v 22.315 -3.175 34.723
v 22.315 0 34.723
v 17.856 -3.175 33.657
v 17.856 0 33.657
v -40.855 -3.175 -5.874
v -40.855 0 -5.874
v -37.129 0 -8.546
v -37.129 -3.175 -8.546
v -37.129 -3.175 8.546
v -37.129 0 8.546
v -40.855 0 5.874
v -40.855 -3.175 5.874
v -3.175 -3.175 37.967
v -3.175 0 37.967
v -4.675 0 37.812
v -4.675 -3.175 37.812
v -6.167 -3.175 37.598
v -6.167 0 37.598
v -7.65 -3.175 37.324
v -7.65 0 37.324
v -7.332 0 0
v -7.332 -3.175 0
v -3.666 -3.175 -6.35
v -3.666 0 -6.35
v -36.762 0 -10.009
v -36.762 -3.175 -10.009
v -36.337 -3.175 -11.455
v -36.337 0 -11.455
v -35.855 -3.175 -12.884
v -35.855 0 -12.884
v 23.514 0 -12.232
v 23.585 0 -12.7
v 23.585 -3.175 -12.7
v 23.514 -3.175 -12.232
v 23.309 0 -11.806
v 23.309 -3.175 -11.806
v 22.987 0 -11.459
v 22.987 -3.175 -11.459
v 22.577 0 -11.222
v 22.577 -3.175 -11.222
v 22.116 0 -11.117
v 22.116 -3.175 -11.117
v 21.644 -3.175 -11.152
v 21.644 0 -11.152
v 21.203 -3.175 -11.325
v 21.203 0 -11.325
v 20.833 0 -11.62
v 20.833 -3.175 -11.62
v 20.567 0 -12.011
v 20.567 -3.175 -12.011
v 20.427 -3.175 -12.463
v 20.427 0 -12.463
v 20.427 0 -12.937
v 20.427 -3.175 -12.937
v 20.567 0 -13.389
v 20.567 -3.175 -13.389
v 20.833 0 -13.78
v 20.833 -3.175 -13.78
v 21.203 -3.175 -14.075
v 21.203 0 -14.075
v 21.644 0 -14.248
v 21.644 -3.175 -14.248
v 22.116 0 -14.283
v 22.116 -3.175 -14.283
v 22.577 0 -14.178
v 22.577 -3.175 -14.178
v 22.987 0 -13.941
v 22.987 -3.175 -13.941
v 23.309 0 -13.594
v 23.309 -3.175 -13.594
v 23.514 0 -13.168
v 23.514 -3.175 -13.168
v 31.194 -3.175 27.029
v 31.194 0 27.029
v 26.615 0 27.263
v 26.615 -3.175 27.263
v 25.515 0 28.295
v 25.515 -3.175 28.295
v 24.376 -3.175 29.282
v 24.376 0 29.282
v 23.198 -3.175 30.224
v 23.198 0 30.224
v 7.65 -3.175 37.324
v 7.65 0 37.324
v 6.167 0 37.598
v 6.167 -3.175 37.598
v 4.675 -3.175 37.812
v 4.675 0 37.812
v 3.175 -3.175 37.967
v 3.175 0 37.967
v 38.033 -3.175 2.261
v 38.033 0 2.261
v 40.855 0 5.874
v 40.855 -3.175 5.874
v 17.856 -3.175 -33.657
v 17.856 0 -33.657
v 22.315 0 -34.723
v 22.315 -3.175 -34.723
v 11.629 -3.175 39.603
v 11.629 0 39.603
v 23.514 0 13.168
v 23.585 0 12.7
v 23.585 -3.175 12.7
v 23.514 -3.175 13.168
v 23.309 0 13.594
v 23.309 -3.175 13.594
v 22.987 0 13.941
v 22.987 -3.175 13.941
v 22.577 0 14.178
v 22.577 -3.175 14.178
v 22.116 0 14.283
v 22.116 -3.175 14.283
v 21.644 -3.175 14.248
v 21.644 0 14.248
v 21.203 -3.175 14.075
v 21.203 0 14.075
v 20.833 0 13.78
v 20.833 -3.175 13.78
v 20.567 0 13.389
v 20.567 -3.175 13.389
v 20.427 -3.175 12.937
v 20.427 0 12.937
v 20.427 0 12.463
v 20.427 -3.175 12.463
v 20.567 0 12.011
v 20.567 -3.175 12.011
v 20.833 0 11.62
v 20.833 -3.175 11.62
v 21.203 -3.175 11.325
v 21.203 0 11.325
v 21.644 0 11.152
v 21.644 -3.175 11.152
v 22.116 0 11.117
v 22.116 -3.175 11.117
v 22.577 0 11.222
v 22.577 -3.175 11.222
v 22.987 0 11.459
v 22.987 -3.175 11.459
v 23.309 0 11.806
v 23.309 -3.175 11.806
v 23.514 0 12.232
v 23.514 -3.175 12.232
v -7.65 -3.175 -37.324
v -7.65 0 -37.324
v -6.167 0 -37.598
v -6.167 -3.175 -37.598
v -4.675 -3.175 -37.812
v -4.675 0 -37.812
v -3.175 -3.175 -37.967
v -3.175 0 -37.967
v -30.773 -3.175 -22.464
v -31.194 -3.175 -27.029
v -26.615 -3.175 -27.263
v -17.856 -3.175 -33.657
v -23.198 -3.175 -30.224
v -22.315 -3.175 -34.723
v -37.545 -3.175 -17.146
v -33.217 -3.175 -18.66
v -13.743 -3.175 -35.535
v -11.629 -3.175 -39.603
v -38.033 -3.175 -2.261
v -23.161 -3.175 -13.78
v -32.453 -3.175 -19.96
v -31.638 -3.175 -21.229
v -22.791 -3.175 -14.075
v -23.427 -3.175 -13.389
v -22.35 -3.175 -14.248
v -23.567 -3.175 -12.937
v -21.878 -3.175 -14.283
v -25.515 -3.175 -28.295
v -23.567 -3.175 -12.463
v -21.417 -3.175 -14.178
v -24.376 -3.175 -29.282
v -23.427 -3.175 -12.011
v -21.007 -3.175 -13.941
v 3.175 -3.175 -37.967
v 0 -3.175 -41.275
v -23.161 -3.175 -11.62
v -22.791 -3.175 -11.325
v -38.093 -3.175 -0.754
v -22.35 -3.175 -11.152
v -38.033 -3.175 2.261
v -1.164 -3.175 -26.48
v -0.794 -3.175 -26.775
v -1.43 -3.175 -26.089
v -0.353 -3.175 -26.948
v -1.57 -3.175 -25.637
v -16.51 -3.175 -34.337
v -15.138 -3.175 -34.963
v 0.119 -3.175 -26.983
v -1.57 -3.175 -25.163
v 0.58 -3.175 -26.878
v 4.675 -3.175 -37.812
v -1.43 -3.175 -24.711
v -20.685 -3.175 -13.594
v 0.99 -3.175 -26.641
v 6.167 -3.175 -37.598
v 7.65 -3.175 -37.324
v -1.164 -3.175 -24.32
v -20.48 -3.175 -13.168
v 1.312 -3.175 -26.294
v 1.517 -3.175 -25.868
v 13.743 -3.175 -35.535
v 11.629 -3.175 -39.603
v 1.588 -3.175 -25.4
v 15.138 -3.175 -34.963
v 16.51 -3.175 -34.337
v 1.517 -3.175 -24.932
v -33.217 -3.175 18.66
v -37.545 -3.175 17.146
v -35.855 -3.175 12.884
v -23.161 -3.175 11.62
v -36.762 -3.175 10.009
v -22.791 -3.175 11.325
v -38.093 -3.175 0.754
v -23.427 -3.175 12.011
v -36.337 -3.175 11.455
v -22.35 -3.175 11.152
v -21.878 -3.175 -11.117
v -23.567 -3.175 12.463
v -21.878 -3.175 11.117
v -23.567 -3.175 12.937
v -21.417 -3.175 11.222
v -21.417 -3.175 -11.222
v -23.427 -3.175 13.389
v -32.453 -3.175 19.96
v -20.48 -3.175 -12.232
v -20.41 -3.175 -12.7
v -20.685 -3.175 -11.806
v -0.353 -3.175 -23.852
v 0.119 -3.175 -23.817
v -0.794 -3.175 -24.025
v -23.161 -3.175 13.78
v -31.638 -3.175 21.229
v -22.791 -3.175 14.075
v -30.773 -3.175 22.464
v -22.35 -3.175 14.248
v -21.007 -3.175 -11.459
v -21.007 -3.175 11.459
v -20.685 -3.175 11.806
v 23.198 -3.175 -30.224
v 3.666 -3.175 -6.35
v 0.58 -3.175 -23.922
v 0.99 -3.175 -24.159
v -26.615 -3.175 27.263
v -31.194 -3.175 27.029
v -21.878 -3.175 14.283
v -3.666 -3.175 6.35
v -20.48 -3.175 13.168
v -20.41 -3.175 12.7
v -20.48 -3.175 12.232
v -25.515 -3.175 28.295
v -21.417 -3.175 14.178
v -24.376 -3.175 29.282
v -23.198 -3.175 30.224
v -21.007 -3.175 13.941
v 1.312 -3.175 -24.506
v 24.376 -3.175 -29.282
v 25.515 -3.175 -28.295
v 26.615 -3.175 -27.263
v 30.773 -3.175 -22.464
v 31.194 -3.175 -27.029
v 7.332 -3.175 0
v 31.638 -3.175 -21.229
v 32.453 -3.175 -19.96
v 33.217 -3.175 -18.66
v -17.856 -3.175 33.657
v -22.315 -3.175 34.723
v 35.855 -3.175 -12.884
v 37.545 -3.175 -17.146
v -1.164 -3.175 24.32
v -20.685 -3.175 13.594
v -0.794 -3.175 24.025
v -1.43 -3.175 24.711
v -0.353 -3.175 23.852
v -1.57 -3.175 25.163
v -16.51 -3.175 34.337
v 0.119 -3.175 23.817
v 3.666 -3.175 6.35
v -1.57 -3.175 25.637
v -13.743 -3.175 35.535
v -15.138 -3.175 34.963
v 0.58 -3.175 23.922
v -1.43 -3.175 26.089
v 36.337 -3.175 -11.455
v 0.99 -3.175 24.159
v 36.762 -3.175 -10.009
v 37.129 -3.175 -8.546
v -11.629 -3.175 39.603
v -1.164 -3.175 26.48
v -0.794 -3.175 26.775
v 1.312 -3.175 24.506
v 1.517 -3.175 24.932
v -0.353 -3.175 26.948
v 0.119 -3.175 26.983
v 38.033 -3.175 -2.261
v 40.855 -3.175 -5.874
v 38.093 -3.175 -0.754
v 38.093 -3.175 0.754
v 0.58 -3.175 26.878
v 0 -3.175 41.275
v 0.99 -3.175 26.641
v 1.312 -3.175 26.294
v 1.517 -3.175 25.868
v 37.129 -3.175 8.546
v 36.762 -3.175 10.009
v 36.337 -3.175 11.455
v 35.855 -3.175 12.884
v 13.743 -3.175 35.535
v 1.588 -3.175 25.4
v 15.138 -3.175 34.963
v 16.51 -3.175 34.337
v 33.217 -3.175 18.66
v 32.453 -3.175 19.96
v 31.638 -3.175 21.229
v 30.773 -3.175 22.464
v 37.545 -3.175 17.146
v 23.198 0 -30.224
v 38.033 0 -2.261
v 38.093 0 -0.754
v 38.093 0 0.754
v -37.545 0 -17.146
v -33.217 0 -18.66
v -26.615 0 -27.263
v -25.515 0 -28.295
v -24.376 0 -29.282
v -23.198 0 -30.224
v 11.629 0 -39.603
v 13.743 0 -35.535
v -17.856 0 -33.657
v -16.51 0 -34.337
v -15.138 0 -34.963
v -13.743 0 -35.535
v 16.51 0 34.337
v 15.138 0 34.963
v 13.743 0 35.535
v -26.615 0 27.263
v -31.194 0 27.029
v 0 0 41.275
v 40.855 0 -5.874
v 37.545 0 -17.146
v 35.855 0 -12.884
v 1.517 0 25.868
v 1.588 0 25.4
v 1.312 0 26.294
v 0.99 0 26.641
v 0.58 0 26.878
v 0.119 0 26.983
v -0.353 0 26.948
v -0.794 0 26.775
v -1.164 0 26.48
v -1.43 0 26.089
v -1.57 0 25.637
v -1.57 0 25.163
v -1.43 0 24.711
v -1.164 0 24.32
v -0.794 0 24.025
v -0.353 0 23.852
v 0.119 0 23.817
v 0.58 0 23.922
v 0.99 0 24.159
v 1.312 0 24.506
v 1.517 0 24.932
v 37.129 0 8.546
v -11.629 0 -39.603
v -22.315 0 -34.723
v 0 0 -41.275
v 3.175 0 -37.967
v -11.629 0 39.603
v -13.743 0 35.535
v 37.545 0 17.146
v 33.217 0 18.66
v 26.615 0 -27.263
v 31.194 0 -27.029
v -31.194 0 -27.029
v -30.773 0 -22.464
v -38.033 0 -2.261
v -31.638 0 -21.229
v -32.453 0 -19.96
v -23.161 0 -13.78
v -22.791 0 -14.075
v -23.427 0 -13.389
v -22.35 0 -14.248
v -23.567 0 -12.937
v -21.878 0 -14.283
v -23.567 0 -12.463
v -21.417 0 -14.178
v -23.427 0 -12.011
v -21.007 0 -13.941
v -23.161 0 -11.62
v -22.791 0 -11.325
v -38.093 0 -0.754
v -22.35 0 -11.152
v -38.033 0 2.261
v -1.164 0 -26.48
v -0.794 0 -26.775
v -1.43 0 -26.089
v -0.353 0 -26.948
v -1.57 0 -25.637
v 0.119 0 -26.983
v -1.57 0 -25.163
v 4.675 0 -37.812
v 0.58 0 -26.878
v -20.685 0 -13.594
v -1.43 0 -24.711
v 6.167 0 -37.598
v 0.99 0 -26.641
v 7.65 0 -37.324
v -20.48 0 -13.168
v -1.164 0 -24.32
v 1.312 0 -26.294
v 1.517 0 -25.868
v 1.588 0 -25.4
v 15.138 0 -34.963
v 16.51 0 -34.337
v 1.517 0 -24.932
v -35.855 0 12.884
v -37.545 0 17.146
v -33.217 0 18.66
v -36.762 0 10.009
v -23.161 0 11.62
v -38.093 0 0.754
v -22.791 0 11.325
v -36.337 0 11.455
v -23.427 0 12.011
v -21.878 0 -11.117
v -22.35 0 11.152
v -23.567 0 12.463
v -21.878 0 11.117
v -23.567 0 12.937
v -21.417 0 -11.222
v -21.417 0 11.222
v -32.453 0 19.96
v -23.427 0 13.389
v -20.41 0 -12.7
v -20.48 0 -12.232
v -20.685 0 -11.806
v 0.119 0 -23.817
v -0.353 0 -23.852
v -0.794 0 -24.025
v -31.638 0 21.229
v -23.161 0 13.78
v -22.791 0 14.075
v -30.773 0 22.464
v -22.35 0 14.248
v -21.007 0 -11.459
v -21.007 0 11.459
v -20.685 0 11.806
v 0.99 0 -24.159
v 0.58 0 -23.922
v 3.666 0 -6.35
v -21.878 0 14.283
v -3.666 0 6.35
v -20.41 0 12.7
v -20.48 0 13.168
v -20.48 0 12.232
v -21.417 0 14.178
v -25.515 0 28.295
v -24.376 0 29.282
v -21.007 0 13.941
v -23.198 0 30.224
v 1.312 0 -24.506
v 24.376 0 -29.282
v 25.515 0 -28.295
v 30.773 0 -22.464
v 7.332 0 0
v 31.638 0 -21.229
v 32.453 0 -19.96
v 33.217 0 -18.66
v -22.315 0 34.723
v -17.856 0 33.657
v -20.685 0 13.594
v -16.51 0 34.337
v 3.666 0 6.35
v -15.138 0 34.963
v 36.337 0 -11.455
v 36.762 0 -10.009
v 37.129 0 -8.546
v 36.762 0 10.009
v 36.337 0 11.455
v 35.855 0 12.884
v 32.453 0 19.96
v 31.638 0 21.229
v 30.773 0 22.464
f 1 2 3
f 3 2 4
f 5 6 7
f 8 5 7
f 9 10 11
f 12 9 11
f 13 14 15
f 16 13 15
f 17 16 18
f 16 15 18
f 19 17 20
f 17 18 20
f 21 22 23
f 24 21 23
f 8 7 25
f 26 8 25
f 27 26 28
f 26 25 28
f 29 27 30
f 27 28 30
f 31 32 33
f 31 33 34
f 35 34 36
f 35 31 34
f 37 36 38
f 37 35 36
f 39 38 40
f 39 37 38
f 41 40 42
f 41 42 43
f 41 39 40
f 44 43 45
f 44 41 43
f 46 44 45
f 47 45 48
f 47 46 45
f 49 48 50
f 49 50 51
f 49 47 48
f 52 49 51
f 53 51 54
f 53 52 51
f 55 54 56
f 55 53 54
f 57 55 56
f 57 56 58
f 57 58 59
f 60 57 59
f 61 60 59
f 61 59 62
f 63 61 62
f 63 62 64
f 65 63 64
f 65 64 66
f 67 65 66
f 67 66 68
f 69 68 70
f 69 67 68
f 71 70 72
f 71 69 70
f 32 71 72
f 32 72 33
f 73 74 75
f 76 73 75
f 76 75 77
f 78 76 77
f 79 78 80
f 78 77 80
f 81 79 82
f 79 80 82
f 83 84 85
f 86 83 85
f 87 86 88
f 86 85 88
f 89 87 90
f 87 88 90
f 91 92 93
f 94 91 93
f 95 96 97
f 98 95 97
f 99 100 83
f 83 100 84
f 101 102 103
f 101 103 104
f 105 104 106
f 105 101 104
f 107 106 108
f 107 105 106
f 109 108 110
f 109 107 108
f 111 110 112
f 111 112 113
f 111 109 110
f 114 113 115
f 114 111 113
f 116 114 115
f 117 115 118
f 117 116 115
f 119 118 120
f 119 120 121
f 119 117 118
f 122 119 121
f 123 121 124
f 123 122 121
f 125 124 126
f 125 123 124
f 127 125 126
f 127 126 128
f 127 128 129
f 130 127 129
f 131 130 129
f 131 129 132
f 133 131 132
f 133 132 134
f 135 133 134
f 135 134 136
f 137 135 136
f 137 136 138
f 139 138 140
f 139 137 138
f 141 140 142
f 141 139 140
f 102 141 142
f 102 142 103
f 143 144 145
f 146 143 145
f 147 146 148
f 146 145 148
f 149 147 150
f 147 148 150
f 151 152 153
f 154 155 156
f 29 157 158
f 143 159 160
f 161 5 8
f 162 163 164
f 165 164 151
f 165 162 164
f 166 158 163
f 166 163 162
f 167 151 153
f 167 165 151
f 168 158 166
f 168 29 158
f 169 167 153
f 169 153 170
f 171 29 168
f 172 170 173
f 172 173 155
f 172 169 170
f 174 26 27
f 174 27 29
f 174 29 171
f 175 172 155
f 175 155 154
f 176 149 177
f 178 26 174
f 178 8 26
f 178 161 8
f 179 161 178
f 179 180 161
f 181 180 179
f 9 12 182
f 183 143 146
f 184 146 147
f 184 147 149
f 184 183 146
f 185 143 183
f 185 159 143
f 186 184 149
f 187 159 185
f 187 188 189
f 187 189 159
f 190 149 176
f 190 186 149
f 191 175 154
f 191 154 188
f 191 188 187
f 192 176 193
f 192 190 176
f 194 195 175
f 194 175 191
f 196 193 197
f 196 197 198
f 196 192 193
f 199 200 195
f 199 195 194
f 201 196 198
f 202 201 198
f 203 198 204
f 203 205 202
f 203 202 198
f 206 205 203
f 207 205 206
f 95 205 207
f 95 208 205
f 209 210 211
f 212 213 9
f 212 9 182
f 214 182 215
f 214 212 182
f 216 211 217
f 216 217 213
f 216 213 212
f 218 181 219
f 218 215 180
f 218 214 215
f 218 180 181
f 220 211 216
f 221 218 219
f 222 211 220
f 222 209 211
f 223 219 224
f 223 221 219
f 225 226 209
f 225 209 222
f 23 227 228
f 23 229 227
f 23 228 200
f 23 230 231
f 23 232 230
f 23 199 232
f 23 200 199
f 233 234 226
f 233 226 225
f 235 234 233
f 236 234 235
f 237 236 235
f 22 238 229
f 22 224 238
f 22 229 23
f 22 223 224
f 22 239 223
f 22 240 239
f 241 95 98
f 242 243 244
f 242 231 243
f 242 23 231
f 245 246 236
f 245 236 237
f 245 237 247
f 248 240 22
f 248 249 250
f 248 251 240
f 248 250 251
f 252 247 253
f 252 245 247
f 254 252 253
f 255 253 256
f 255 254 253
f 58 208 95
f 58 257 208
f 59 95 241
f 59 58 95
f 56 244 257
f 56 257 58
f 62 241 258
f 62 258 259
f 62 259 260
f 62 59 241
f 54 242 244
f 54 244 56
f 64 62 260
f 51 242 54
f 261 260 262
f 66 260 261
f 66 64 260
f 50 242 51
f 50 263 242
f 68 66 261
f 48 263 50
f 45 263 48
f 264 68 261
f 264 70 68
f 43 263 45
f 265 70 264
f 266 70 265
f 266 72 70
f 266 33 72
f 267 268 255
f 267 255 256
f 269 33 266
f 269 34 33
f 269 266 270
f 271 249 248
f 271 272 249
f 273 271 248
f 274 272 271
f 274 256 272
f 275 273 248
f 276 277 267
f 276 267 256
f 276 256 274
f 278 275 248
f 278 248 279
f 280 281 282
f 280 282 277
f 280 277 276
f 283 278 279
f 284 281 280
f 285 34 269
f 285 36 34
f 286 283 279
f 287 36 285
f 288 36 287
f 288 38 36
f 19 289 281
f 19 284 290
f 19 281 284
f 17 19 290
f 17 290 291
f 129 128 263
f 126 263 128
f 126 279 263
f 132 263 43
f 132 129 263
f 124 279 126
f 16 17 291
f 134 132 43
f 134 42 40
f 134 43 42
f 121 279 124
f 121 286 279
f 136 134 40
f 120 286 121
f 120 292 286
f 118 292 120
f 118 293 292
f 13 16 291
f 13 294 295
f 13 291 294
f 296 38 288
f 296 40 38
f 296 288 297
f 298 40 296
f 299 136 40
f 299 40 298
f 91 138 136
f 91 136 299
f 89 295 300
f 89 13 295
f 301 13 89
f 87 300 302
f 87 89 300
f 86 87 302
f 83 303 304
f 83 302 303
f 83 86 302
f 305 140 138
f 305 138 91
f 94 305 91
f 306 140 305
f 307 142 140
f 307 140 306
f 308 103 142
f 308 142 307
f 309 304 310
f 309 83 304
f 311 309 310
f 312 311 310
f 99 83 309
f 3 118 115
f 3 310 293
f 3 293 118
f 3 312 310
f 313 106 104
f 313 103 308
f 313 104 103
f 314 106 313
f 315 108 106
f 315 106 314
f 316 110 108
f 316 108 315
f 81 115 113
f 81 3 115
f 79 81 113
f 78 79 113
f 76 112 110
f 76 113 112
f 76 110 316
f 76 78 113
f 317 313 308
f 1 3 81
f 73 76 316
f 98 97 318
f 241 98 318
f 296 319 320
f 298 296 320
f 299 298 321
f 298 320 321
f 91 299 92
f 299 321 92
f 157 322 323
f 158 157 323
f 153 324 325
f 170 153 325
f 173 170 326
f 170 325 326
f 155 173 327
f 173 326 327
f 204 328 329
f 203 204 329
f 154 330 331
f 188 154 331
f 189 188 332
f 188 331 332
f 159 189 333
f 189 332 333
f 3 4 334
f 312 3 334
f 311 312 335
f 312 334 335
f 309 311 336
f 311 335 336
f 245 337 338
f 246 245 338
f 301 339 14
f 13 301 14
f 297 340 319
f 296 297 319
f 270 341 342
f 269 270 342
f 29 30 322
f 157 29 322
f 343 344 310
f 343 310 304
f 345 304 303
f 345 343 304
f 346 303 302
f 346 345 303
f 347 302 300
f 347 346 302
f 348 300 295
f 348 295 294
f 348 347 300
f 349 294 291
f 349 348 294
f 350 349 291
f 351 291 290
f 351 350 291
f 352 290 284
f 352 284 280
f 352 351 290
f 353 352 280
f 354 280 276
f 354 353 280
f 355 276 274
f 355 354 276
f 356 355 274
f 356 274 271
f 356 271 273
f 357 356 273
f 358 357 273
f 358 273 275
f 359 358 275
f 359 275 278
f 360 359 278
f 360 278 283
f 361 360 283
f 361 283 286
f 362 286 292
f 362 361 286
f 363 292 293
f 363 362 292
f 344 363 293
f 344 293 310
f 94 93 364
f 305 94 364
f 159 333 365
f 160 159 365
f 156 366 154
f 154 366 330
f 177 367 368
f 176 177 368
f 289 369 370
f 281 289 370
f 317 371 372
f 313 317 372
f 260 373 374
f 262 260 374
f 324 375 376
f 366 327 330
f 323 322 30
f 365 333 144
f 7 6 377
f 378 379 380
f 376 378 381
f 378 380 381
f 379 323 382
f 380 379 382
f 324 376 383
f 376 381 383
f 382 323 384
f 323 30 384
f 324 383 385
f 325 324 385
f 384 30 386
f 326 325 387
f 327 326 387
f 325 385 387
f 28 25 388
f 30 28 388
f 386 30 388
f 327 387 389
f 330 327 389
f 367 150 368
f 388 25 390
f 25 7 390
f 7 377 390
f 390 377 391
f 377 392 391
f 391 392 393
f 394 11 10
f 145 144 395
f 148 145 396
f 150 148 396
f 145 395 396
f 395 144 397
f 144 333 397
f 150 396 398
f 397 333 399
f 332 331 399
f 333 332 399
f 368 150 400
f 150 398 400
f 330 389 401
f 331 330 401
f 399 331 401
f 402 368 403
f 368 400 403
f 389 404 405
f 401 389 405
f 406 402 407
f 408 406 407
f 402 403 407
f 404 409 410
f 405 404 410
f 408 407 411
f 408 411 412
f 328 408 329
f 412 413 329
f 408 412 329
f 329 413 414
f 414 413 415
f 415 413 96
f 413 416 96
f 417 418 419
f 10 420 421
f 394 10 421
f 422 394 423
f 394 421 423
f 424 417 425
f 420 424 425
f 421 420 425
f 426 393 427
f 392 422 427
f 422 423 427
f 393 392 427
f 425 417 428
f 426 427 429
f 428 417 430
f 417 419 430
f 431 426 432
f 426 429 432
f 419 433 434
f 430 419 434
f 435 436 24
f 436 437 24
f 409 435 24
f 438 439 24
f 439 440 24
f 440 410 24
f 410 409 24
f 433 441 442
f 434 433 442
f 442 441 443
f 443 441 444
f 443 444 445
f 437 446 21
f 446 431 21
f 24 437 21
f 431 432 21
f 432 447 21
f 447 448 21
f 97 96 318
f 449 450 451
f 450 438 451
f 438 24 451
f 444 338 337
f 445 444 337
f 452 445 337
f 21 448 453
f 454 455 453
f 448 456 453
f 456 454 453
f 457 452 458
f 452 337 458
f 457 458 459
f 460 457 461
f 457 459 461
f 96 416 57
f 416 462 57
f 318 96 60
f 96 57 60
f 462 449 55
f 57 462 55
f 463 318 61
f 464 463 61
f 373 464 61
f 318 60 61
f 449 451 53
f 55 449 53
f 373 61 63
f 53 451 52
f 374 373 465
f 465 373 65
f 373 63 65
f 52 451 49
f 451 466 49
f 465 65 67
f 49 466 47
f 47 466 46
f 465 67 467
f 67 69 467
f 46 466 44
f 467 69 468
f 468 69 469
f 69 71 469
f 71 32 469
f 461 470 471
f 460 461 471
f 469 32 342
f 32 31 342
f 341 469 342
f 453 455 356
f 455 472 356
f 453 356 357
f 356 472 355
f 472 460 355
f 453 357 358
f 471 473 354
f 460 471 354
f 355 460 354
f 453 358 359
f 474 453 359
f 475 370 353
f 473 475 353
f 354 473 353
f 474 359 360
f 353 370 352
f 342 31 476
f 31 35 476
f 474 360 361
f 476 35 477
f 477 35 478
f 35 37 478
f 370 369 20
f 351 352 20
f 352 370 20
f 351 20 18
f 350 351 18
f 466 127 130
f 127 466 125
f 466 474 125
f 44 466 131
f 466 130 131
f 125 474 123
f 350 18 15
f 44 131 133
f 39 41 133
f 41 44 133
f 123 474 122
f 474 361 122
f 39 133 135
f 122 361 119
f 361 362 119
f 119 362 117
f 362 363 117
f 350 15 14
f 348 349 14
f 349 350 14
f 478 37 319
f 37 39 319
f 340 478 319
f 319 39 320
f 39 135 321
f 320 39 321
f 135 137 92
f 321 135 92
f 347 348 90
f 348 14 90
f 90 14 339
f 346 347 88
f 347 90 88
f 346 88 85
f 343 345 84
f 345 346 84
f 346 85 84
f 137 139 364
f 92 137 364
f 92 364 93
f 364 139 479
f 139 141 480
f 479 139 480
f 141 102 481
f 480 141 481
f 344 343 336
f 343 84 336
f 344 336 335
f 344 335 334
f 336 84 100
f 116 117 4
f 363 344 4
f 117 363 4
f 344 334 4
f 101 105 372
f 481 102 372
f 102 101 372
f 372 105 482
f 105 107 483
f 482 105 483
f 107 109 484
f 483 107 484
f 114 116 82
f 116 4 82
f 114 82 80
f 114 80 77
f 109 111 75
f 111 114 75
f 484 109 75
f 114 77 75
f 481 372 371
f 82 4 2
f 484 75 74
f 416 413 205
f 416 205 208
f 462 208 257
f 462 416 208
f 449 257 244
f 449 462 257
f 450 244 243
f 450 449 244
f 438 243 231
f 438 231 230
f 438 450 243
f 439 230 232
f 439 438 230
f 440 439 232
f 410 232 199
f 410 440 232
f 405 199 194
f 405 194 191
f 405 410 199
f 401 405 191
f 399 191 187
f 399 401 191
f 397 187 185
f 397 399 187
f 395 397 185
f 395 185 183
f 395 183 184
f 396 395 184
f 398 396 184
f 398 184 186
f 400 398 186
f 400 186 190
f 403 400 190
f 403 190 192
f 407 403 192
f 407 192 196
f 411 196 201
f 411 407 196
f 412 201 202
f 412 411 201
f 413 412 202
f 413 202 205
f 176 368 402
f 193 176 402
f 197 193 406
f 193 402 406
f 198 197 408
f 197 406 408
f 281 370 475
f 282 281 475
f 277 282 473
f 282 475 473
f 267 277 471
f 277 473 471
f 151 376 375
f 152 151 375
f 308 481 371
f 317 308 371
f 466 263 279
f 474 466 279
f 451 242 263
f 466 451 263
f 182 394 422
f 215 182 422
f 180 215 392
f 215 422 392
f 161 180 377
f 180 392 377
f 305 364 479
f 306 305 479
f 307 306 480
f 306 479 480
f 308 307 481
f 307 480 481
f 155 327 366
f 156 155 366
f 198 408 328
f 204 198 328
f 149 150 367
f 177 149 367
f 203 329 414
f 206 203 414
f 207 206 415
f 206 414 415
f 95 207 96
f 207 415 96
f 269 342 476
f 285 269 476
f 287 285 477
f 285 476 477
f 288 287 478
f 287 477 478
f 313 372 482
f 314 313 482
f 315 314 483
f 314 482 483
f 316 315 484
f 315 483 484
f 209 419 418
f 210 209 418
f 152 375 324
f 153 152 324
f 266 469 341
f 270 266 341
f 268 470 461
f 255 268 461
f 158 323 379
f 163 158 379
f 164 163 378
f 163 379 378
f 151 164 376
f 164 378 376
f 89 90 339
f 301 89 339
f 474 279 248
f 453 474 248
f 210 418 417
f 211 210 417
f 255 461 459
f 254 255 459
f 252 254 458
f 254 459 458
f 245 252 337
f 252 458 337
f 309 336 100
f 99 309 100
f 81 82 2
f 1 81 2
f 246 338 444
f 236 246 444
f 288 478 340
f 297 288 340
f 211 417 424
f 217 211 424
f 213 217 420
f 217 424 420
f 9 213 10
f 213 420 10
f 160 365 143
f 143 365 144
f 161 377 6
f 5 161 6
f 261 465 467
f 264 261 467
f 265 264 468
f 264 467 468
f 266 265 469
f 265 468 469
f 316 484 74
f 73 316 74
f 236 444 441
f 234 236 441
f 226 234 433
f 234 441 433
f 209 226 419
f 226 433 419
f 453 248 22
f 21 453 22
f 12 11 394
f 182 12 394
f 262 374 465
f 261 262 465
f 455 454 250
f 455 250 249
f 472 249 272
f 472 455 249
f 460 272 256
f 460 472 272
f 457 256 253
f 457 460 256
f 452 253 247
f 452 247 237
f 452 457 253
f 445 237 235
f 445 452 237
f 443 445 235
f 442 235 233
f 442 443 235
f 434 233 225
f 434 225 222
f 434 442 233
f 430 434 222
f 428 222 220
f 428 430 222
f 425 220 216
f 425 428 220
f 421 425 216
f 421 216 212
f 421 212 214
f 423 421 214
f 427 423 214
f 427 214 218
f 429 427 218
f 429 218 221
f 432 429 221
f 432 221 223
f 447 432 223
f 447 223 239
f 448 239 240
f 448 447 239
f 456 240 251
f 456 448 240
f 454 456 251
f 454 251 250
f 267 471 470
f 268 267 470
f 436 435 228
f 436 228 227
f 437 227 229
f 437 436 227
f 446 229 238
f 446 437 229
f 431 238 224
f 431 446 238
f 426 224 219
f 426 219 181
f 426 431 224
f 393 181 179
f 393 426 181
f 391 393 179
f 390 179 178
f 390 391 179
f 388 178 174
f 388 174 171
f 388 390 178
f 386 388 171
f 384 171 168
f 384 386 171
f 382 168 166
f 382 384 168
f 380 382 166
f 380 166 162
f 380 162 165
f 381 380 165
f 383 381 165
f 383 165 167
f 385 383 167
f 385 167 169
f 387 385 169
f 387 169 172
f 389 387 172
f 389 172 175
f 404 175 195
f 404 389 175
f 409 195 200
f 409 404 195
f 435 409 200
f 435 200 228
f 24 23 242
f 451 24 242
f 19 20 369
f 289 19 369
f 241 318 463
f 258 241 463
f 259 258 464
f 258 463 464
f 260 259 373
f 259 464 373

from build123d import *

# Parameters (mm, degrees)
F0_R     = 1.5875
F1_DEPTH = 3.175
F3_DEPTH = 3.176


with BuildPart() as f1:
    # F0 (on Front) → F1 (new body)
    with BuildSketch(Plane.XZ):
        with BuildLine():
            Line((-22.31495, 34.72274), (-23.197748, 30.22374))
            ThreePointArc((-23.197748, 30.22374), (-24.950194, 28.794059), (-26.614722, 27.262915))
            Line((-26.614722, 27.262915), (-31.193564, 27.029377))
            Line((-31.193564, 27.029377), (-30.773088, 22.463906))
            ThreePointArc((-30.773088, 22.463906), (-32.05176, 20.598415), (-33.21749, 18.660342))
            Line((-33.21749, 18.660342), (-37.545061, 17.146255))
            Line((-37.545061, 17.146255), (-35.855375, 12.884179))
            ThreePointArc((-35.855375, 12.884179), (-36.556682, 10.73401), (-37.129174, 8.546019))
            Line((-37.129174, 8.546019), (-40.85488, 5.874045))
            Line((-40.85488, 5.874045), (-38.032873, 2.260652))
            ThreePointArc((-38.032873, 2.260652), (-38.1, 0), (-38.032873, -2.260652))
            Line((-38.032873, -2.260652), (-40.85488, -5.874045))
            Line((-40.85488, -5.874045), (-37.129174, -8.546019))
            ThreePointArc((-37.129174, -8.546019), (-36.556682, -10.73401), (-35.855375, -12.884179))
            Line((-35.855375, -12.884179), (-37.545061, -17.146255))
            Line((-37.545061, -17.146255), (-33.21749, -18.660342))
            ThreePointArc((-33.21749, -18.660342), (-32.05176, -20.598415), (-30.773088, -22.463906))
            Line((-30.773088, -22.463906), (-31.193564, -27.029377))
            Line((-31.193564, -27.029377), (-26.614722, -27.262915))
            ThreePointArc((-26.614722, -27.262915), (-24.950194, -28.794059), (-23.197748, -30.22374))
            Line((-23.197748, -30.22374), (-22.31495, -34.72274))
            Line((-22.31495, -34.72274), (-17.855788, -33.656809))
            ThreePointArc((-17.855788, -33.656809), (-15.827312, -34.656979), (-13.743065, -35.535027))
            Line((-13.743065, -35.535027), (-11.628511, -39.603072))
            Line((-11.628511, -39.603072), (-7.650284, -37.324029))
            ThreePointArc((-7.650284, -37.324029), (-5.422195, -37.712197), (-3.175, -37.967478))
            Line((-3.175, -37.967478), (0, -41.275))
            Line((0, -41.275), (3.175, -37.967478))
            ThreePointArc((3.175, -37.967478), (5.422195, -37.712197), (7.650284, -37.324029))
            Line((7.650284, -37.324029), (11.628511, -39.603072))
            Line((11.628511, -39.603072), (13.743065, -35.535027))
            ThreePointArc((13.743065, -35.535027), (15.827312, -34.656979), (17.855788, -33.656809))
            Line((17.855788, -33.656809), (22.31495, -34.72274))
            Line((22.31495, -34.72274), (23.197748, -30.22374))
            ThreePointArc((23.197748, -30.22374), (24.950194, -28.794059), (26.614722, -27.262915))
            Line((26.614722, -27.262915), (31.193564, -27.029377))
            Line((31.193564, -27.029377), (30.773088, -22.463906))
            ThreePointArc((30.773088, -22.463906), (32.05176, -20.598415), (33.21749, -18.660342))
            Line((33.21749, -18.660342), (37.545061, -17.146255))
            Line((37.545061, -17.146255), (35.855375, -12.884179))
            ThreePointArc((35.855375, -12.884179), (36.556682, -10.73401), (37.129174, -8.546019))
            Line((37.129174, -8.546019), (40.85488, -5.874045))
            Line((40.85488, -5.874045), (38.032873, -2.260652))
            ThreePointArc((38.032873, -2.260652), (38.1, 0), (38.032873, 2.260652))
            Line((38.032873, 2.260652), (40.85488, 5.874045))
            Line((40.85488, 5.874045), (37.129174, 8.546019))
            ThreePointArc((37.129174, 8.546019), (36.556682, 10.73401), (35.855375, 12.884179))
            Line((35.855375, 12.884179), (37.545061, 17.146255))
            Line((37.545061, 17.146255), (33.21749, 18.660342))
            ThreePointArc((33.21749, 18.660342), (32.05176, 20.598415), (30.773088, 22.463906))
            Line((30.773088, 22.463906), (31.193564, 27.029377))
            Line((31.193564, 27.029377), (26.614722, 27.262915))
            ThreePointArc((26.614722, 27.262915), (24.950194, 28.794059), (23.197748, 30.22374))
            Line((23.197748, 30.22374), (22.31495, 34.72274))
            Line((22.31495, 34.72274), (17.855788, 33.656809))
            ThreePointArc((17.855788, 33.656809), (15.827312, 34.656979), (13.743065, 35.535027))
            Line((13.743065, 35.535027), (11.628511, 39.603072))
            Line((11.628511, 39.603072), (7.650284, 37.324029))
            ThreePointArc((7.650284, 37.324029), (5.422195, 37.712197), (3.175, 37.967478))
            Line((3.175, 37.967478), (0, 41.275))
            Line((0, 41.275), (-3.175, 37.967478))
            ThreePointArc((-3.175, 37.967478), (-5.422195, 37.712197), (-7.650284, 37.324029))
            Line((-7.650284, 37.324029), (-11.628511, 39.603072))
            Line((-11.628511, 39.603072), (-13.743065, 35.535027))
            ThreePointArc((-13.743065, 35.535027), (-15.827312, 34.656979), (-17.855788, 33.656809))
            Line((-17.855788, 33.656809), (-22.31495, 34.72274))
        make_face()
        with Locations((-21.997045, -12.7)):
            Circle(F0_R, mode=Mode.SUBTRACT)
        with Locations((0, -25.4)):
            Circle(F0_R, mode=Mode.SUBTRACT)
        with Locations((21.997045, -12.7)):
            Circle(F0_R, mode=Mode.SUBTRACT)
        with Locations((-21.997045, 12.7)):
            Circle(F0_R, mode=Mode.SUBTRACT)
        with Locations((21.997045, 12.7)):
            Circle(F0_R, mode=Mode.SUBTRACT)
        with Locations((0, 25.4)):
            Circle(F0_R, mode=Mode.SUBTRACT)
    extrude(amount=F1_DEPTH)

    # F2 (on face) → F3 (cut, through all)
    with BuildSketch(Plane.XZ.offset(3.175)):
        Polygon((3.666174, 6.35), (-3.666174, 6.35), (-7.332348, 0), (-3.666174, -6.35), (3.666174, -6.35), (7.332348, 0), align=None)
    extrude(amount=-F3_DEPTH, mode=Mode.SUBTRACT)


solid = f1.part
